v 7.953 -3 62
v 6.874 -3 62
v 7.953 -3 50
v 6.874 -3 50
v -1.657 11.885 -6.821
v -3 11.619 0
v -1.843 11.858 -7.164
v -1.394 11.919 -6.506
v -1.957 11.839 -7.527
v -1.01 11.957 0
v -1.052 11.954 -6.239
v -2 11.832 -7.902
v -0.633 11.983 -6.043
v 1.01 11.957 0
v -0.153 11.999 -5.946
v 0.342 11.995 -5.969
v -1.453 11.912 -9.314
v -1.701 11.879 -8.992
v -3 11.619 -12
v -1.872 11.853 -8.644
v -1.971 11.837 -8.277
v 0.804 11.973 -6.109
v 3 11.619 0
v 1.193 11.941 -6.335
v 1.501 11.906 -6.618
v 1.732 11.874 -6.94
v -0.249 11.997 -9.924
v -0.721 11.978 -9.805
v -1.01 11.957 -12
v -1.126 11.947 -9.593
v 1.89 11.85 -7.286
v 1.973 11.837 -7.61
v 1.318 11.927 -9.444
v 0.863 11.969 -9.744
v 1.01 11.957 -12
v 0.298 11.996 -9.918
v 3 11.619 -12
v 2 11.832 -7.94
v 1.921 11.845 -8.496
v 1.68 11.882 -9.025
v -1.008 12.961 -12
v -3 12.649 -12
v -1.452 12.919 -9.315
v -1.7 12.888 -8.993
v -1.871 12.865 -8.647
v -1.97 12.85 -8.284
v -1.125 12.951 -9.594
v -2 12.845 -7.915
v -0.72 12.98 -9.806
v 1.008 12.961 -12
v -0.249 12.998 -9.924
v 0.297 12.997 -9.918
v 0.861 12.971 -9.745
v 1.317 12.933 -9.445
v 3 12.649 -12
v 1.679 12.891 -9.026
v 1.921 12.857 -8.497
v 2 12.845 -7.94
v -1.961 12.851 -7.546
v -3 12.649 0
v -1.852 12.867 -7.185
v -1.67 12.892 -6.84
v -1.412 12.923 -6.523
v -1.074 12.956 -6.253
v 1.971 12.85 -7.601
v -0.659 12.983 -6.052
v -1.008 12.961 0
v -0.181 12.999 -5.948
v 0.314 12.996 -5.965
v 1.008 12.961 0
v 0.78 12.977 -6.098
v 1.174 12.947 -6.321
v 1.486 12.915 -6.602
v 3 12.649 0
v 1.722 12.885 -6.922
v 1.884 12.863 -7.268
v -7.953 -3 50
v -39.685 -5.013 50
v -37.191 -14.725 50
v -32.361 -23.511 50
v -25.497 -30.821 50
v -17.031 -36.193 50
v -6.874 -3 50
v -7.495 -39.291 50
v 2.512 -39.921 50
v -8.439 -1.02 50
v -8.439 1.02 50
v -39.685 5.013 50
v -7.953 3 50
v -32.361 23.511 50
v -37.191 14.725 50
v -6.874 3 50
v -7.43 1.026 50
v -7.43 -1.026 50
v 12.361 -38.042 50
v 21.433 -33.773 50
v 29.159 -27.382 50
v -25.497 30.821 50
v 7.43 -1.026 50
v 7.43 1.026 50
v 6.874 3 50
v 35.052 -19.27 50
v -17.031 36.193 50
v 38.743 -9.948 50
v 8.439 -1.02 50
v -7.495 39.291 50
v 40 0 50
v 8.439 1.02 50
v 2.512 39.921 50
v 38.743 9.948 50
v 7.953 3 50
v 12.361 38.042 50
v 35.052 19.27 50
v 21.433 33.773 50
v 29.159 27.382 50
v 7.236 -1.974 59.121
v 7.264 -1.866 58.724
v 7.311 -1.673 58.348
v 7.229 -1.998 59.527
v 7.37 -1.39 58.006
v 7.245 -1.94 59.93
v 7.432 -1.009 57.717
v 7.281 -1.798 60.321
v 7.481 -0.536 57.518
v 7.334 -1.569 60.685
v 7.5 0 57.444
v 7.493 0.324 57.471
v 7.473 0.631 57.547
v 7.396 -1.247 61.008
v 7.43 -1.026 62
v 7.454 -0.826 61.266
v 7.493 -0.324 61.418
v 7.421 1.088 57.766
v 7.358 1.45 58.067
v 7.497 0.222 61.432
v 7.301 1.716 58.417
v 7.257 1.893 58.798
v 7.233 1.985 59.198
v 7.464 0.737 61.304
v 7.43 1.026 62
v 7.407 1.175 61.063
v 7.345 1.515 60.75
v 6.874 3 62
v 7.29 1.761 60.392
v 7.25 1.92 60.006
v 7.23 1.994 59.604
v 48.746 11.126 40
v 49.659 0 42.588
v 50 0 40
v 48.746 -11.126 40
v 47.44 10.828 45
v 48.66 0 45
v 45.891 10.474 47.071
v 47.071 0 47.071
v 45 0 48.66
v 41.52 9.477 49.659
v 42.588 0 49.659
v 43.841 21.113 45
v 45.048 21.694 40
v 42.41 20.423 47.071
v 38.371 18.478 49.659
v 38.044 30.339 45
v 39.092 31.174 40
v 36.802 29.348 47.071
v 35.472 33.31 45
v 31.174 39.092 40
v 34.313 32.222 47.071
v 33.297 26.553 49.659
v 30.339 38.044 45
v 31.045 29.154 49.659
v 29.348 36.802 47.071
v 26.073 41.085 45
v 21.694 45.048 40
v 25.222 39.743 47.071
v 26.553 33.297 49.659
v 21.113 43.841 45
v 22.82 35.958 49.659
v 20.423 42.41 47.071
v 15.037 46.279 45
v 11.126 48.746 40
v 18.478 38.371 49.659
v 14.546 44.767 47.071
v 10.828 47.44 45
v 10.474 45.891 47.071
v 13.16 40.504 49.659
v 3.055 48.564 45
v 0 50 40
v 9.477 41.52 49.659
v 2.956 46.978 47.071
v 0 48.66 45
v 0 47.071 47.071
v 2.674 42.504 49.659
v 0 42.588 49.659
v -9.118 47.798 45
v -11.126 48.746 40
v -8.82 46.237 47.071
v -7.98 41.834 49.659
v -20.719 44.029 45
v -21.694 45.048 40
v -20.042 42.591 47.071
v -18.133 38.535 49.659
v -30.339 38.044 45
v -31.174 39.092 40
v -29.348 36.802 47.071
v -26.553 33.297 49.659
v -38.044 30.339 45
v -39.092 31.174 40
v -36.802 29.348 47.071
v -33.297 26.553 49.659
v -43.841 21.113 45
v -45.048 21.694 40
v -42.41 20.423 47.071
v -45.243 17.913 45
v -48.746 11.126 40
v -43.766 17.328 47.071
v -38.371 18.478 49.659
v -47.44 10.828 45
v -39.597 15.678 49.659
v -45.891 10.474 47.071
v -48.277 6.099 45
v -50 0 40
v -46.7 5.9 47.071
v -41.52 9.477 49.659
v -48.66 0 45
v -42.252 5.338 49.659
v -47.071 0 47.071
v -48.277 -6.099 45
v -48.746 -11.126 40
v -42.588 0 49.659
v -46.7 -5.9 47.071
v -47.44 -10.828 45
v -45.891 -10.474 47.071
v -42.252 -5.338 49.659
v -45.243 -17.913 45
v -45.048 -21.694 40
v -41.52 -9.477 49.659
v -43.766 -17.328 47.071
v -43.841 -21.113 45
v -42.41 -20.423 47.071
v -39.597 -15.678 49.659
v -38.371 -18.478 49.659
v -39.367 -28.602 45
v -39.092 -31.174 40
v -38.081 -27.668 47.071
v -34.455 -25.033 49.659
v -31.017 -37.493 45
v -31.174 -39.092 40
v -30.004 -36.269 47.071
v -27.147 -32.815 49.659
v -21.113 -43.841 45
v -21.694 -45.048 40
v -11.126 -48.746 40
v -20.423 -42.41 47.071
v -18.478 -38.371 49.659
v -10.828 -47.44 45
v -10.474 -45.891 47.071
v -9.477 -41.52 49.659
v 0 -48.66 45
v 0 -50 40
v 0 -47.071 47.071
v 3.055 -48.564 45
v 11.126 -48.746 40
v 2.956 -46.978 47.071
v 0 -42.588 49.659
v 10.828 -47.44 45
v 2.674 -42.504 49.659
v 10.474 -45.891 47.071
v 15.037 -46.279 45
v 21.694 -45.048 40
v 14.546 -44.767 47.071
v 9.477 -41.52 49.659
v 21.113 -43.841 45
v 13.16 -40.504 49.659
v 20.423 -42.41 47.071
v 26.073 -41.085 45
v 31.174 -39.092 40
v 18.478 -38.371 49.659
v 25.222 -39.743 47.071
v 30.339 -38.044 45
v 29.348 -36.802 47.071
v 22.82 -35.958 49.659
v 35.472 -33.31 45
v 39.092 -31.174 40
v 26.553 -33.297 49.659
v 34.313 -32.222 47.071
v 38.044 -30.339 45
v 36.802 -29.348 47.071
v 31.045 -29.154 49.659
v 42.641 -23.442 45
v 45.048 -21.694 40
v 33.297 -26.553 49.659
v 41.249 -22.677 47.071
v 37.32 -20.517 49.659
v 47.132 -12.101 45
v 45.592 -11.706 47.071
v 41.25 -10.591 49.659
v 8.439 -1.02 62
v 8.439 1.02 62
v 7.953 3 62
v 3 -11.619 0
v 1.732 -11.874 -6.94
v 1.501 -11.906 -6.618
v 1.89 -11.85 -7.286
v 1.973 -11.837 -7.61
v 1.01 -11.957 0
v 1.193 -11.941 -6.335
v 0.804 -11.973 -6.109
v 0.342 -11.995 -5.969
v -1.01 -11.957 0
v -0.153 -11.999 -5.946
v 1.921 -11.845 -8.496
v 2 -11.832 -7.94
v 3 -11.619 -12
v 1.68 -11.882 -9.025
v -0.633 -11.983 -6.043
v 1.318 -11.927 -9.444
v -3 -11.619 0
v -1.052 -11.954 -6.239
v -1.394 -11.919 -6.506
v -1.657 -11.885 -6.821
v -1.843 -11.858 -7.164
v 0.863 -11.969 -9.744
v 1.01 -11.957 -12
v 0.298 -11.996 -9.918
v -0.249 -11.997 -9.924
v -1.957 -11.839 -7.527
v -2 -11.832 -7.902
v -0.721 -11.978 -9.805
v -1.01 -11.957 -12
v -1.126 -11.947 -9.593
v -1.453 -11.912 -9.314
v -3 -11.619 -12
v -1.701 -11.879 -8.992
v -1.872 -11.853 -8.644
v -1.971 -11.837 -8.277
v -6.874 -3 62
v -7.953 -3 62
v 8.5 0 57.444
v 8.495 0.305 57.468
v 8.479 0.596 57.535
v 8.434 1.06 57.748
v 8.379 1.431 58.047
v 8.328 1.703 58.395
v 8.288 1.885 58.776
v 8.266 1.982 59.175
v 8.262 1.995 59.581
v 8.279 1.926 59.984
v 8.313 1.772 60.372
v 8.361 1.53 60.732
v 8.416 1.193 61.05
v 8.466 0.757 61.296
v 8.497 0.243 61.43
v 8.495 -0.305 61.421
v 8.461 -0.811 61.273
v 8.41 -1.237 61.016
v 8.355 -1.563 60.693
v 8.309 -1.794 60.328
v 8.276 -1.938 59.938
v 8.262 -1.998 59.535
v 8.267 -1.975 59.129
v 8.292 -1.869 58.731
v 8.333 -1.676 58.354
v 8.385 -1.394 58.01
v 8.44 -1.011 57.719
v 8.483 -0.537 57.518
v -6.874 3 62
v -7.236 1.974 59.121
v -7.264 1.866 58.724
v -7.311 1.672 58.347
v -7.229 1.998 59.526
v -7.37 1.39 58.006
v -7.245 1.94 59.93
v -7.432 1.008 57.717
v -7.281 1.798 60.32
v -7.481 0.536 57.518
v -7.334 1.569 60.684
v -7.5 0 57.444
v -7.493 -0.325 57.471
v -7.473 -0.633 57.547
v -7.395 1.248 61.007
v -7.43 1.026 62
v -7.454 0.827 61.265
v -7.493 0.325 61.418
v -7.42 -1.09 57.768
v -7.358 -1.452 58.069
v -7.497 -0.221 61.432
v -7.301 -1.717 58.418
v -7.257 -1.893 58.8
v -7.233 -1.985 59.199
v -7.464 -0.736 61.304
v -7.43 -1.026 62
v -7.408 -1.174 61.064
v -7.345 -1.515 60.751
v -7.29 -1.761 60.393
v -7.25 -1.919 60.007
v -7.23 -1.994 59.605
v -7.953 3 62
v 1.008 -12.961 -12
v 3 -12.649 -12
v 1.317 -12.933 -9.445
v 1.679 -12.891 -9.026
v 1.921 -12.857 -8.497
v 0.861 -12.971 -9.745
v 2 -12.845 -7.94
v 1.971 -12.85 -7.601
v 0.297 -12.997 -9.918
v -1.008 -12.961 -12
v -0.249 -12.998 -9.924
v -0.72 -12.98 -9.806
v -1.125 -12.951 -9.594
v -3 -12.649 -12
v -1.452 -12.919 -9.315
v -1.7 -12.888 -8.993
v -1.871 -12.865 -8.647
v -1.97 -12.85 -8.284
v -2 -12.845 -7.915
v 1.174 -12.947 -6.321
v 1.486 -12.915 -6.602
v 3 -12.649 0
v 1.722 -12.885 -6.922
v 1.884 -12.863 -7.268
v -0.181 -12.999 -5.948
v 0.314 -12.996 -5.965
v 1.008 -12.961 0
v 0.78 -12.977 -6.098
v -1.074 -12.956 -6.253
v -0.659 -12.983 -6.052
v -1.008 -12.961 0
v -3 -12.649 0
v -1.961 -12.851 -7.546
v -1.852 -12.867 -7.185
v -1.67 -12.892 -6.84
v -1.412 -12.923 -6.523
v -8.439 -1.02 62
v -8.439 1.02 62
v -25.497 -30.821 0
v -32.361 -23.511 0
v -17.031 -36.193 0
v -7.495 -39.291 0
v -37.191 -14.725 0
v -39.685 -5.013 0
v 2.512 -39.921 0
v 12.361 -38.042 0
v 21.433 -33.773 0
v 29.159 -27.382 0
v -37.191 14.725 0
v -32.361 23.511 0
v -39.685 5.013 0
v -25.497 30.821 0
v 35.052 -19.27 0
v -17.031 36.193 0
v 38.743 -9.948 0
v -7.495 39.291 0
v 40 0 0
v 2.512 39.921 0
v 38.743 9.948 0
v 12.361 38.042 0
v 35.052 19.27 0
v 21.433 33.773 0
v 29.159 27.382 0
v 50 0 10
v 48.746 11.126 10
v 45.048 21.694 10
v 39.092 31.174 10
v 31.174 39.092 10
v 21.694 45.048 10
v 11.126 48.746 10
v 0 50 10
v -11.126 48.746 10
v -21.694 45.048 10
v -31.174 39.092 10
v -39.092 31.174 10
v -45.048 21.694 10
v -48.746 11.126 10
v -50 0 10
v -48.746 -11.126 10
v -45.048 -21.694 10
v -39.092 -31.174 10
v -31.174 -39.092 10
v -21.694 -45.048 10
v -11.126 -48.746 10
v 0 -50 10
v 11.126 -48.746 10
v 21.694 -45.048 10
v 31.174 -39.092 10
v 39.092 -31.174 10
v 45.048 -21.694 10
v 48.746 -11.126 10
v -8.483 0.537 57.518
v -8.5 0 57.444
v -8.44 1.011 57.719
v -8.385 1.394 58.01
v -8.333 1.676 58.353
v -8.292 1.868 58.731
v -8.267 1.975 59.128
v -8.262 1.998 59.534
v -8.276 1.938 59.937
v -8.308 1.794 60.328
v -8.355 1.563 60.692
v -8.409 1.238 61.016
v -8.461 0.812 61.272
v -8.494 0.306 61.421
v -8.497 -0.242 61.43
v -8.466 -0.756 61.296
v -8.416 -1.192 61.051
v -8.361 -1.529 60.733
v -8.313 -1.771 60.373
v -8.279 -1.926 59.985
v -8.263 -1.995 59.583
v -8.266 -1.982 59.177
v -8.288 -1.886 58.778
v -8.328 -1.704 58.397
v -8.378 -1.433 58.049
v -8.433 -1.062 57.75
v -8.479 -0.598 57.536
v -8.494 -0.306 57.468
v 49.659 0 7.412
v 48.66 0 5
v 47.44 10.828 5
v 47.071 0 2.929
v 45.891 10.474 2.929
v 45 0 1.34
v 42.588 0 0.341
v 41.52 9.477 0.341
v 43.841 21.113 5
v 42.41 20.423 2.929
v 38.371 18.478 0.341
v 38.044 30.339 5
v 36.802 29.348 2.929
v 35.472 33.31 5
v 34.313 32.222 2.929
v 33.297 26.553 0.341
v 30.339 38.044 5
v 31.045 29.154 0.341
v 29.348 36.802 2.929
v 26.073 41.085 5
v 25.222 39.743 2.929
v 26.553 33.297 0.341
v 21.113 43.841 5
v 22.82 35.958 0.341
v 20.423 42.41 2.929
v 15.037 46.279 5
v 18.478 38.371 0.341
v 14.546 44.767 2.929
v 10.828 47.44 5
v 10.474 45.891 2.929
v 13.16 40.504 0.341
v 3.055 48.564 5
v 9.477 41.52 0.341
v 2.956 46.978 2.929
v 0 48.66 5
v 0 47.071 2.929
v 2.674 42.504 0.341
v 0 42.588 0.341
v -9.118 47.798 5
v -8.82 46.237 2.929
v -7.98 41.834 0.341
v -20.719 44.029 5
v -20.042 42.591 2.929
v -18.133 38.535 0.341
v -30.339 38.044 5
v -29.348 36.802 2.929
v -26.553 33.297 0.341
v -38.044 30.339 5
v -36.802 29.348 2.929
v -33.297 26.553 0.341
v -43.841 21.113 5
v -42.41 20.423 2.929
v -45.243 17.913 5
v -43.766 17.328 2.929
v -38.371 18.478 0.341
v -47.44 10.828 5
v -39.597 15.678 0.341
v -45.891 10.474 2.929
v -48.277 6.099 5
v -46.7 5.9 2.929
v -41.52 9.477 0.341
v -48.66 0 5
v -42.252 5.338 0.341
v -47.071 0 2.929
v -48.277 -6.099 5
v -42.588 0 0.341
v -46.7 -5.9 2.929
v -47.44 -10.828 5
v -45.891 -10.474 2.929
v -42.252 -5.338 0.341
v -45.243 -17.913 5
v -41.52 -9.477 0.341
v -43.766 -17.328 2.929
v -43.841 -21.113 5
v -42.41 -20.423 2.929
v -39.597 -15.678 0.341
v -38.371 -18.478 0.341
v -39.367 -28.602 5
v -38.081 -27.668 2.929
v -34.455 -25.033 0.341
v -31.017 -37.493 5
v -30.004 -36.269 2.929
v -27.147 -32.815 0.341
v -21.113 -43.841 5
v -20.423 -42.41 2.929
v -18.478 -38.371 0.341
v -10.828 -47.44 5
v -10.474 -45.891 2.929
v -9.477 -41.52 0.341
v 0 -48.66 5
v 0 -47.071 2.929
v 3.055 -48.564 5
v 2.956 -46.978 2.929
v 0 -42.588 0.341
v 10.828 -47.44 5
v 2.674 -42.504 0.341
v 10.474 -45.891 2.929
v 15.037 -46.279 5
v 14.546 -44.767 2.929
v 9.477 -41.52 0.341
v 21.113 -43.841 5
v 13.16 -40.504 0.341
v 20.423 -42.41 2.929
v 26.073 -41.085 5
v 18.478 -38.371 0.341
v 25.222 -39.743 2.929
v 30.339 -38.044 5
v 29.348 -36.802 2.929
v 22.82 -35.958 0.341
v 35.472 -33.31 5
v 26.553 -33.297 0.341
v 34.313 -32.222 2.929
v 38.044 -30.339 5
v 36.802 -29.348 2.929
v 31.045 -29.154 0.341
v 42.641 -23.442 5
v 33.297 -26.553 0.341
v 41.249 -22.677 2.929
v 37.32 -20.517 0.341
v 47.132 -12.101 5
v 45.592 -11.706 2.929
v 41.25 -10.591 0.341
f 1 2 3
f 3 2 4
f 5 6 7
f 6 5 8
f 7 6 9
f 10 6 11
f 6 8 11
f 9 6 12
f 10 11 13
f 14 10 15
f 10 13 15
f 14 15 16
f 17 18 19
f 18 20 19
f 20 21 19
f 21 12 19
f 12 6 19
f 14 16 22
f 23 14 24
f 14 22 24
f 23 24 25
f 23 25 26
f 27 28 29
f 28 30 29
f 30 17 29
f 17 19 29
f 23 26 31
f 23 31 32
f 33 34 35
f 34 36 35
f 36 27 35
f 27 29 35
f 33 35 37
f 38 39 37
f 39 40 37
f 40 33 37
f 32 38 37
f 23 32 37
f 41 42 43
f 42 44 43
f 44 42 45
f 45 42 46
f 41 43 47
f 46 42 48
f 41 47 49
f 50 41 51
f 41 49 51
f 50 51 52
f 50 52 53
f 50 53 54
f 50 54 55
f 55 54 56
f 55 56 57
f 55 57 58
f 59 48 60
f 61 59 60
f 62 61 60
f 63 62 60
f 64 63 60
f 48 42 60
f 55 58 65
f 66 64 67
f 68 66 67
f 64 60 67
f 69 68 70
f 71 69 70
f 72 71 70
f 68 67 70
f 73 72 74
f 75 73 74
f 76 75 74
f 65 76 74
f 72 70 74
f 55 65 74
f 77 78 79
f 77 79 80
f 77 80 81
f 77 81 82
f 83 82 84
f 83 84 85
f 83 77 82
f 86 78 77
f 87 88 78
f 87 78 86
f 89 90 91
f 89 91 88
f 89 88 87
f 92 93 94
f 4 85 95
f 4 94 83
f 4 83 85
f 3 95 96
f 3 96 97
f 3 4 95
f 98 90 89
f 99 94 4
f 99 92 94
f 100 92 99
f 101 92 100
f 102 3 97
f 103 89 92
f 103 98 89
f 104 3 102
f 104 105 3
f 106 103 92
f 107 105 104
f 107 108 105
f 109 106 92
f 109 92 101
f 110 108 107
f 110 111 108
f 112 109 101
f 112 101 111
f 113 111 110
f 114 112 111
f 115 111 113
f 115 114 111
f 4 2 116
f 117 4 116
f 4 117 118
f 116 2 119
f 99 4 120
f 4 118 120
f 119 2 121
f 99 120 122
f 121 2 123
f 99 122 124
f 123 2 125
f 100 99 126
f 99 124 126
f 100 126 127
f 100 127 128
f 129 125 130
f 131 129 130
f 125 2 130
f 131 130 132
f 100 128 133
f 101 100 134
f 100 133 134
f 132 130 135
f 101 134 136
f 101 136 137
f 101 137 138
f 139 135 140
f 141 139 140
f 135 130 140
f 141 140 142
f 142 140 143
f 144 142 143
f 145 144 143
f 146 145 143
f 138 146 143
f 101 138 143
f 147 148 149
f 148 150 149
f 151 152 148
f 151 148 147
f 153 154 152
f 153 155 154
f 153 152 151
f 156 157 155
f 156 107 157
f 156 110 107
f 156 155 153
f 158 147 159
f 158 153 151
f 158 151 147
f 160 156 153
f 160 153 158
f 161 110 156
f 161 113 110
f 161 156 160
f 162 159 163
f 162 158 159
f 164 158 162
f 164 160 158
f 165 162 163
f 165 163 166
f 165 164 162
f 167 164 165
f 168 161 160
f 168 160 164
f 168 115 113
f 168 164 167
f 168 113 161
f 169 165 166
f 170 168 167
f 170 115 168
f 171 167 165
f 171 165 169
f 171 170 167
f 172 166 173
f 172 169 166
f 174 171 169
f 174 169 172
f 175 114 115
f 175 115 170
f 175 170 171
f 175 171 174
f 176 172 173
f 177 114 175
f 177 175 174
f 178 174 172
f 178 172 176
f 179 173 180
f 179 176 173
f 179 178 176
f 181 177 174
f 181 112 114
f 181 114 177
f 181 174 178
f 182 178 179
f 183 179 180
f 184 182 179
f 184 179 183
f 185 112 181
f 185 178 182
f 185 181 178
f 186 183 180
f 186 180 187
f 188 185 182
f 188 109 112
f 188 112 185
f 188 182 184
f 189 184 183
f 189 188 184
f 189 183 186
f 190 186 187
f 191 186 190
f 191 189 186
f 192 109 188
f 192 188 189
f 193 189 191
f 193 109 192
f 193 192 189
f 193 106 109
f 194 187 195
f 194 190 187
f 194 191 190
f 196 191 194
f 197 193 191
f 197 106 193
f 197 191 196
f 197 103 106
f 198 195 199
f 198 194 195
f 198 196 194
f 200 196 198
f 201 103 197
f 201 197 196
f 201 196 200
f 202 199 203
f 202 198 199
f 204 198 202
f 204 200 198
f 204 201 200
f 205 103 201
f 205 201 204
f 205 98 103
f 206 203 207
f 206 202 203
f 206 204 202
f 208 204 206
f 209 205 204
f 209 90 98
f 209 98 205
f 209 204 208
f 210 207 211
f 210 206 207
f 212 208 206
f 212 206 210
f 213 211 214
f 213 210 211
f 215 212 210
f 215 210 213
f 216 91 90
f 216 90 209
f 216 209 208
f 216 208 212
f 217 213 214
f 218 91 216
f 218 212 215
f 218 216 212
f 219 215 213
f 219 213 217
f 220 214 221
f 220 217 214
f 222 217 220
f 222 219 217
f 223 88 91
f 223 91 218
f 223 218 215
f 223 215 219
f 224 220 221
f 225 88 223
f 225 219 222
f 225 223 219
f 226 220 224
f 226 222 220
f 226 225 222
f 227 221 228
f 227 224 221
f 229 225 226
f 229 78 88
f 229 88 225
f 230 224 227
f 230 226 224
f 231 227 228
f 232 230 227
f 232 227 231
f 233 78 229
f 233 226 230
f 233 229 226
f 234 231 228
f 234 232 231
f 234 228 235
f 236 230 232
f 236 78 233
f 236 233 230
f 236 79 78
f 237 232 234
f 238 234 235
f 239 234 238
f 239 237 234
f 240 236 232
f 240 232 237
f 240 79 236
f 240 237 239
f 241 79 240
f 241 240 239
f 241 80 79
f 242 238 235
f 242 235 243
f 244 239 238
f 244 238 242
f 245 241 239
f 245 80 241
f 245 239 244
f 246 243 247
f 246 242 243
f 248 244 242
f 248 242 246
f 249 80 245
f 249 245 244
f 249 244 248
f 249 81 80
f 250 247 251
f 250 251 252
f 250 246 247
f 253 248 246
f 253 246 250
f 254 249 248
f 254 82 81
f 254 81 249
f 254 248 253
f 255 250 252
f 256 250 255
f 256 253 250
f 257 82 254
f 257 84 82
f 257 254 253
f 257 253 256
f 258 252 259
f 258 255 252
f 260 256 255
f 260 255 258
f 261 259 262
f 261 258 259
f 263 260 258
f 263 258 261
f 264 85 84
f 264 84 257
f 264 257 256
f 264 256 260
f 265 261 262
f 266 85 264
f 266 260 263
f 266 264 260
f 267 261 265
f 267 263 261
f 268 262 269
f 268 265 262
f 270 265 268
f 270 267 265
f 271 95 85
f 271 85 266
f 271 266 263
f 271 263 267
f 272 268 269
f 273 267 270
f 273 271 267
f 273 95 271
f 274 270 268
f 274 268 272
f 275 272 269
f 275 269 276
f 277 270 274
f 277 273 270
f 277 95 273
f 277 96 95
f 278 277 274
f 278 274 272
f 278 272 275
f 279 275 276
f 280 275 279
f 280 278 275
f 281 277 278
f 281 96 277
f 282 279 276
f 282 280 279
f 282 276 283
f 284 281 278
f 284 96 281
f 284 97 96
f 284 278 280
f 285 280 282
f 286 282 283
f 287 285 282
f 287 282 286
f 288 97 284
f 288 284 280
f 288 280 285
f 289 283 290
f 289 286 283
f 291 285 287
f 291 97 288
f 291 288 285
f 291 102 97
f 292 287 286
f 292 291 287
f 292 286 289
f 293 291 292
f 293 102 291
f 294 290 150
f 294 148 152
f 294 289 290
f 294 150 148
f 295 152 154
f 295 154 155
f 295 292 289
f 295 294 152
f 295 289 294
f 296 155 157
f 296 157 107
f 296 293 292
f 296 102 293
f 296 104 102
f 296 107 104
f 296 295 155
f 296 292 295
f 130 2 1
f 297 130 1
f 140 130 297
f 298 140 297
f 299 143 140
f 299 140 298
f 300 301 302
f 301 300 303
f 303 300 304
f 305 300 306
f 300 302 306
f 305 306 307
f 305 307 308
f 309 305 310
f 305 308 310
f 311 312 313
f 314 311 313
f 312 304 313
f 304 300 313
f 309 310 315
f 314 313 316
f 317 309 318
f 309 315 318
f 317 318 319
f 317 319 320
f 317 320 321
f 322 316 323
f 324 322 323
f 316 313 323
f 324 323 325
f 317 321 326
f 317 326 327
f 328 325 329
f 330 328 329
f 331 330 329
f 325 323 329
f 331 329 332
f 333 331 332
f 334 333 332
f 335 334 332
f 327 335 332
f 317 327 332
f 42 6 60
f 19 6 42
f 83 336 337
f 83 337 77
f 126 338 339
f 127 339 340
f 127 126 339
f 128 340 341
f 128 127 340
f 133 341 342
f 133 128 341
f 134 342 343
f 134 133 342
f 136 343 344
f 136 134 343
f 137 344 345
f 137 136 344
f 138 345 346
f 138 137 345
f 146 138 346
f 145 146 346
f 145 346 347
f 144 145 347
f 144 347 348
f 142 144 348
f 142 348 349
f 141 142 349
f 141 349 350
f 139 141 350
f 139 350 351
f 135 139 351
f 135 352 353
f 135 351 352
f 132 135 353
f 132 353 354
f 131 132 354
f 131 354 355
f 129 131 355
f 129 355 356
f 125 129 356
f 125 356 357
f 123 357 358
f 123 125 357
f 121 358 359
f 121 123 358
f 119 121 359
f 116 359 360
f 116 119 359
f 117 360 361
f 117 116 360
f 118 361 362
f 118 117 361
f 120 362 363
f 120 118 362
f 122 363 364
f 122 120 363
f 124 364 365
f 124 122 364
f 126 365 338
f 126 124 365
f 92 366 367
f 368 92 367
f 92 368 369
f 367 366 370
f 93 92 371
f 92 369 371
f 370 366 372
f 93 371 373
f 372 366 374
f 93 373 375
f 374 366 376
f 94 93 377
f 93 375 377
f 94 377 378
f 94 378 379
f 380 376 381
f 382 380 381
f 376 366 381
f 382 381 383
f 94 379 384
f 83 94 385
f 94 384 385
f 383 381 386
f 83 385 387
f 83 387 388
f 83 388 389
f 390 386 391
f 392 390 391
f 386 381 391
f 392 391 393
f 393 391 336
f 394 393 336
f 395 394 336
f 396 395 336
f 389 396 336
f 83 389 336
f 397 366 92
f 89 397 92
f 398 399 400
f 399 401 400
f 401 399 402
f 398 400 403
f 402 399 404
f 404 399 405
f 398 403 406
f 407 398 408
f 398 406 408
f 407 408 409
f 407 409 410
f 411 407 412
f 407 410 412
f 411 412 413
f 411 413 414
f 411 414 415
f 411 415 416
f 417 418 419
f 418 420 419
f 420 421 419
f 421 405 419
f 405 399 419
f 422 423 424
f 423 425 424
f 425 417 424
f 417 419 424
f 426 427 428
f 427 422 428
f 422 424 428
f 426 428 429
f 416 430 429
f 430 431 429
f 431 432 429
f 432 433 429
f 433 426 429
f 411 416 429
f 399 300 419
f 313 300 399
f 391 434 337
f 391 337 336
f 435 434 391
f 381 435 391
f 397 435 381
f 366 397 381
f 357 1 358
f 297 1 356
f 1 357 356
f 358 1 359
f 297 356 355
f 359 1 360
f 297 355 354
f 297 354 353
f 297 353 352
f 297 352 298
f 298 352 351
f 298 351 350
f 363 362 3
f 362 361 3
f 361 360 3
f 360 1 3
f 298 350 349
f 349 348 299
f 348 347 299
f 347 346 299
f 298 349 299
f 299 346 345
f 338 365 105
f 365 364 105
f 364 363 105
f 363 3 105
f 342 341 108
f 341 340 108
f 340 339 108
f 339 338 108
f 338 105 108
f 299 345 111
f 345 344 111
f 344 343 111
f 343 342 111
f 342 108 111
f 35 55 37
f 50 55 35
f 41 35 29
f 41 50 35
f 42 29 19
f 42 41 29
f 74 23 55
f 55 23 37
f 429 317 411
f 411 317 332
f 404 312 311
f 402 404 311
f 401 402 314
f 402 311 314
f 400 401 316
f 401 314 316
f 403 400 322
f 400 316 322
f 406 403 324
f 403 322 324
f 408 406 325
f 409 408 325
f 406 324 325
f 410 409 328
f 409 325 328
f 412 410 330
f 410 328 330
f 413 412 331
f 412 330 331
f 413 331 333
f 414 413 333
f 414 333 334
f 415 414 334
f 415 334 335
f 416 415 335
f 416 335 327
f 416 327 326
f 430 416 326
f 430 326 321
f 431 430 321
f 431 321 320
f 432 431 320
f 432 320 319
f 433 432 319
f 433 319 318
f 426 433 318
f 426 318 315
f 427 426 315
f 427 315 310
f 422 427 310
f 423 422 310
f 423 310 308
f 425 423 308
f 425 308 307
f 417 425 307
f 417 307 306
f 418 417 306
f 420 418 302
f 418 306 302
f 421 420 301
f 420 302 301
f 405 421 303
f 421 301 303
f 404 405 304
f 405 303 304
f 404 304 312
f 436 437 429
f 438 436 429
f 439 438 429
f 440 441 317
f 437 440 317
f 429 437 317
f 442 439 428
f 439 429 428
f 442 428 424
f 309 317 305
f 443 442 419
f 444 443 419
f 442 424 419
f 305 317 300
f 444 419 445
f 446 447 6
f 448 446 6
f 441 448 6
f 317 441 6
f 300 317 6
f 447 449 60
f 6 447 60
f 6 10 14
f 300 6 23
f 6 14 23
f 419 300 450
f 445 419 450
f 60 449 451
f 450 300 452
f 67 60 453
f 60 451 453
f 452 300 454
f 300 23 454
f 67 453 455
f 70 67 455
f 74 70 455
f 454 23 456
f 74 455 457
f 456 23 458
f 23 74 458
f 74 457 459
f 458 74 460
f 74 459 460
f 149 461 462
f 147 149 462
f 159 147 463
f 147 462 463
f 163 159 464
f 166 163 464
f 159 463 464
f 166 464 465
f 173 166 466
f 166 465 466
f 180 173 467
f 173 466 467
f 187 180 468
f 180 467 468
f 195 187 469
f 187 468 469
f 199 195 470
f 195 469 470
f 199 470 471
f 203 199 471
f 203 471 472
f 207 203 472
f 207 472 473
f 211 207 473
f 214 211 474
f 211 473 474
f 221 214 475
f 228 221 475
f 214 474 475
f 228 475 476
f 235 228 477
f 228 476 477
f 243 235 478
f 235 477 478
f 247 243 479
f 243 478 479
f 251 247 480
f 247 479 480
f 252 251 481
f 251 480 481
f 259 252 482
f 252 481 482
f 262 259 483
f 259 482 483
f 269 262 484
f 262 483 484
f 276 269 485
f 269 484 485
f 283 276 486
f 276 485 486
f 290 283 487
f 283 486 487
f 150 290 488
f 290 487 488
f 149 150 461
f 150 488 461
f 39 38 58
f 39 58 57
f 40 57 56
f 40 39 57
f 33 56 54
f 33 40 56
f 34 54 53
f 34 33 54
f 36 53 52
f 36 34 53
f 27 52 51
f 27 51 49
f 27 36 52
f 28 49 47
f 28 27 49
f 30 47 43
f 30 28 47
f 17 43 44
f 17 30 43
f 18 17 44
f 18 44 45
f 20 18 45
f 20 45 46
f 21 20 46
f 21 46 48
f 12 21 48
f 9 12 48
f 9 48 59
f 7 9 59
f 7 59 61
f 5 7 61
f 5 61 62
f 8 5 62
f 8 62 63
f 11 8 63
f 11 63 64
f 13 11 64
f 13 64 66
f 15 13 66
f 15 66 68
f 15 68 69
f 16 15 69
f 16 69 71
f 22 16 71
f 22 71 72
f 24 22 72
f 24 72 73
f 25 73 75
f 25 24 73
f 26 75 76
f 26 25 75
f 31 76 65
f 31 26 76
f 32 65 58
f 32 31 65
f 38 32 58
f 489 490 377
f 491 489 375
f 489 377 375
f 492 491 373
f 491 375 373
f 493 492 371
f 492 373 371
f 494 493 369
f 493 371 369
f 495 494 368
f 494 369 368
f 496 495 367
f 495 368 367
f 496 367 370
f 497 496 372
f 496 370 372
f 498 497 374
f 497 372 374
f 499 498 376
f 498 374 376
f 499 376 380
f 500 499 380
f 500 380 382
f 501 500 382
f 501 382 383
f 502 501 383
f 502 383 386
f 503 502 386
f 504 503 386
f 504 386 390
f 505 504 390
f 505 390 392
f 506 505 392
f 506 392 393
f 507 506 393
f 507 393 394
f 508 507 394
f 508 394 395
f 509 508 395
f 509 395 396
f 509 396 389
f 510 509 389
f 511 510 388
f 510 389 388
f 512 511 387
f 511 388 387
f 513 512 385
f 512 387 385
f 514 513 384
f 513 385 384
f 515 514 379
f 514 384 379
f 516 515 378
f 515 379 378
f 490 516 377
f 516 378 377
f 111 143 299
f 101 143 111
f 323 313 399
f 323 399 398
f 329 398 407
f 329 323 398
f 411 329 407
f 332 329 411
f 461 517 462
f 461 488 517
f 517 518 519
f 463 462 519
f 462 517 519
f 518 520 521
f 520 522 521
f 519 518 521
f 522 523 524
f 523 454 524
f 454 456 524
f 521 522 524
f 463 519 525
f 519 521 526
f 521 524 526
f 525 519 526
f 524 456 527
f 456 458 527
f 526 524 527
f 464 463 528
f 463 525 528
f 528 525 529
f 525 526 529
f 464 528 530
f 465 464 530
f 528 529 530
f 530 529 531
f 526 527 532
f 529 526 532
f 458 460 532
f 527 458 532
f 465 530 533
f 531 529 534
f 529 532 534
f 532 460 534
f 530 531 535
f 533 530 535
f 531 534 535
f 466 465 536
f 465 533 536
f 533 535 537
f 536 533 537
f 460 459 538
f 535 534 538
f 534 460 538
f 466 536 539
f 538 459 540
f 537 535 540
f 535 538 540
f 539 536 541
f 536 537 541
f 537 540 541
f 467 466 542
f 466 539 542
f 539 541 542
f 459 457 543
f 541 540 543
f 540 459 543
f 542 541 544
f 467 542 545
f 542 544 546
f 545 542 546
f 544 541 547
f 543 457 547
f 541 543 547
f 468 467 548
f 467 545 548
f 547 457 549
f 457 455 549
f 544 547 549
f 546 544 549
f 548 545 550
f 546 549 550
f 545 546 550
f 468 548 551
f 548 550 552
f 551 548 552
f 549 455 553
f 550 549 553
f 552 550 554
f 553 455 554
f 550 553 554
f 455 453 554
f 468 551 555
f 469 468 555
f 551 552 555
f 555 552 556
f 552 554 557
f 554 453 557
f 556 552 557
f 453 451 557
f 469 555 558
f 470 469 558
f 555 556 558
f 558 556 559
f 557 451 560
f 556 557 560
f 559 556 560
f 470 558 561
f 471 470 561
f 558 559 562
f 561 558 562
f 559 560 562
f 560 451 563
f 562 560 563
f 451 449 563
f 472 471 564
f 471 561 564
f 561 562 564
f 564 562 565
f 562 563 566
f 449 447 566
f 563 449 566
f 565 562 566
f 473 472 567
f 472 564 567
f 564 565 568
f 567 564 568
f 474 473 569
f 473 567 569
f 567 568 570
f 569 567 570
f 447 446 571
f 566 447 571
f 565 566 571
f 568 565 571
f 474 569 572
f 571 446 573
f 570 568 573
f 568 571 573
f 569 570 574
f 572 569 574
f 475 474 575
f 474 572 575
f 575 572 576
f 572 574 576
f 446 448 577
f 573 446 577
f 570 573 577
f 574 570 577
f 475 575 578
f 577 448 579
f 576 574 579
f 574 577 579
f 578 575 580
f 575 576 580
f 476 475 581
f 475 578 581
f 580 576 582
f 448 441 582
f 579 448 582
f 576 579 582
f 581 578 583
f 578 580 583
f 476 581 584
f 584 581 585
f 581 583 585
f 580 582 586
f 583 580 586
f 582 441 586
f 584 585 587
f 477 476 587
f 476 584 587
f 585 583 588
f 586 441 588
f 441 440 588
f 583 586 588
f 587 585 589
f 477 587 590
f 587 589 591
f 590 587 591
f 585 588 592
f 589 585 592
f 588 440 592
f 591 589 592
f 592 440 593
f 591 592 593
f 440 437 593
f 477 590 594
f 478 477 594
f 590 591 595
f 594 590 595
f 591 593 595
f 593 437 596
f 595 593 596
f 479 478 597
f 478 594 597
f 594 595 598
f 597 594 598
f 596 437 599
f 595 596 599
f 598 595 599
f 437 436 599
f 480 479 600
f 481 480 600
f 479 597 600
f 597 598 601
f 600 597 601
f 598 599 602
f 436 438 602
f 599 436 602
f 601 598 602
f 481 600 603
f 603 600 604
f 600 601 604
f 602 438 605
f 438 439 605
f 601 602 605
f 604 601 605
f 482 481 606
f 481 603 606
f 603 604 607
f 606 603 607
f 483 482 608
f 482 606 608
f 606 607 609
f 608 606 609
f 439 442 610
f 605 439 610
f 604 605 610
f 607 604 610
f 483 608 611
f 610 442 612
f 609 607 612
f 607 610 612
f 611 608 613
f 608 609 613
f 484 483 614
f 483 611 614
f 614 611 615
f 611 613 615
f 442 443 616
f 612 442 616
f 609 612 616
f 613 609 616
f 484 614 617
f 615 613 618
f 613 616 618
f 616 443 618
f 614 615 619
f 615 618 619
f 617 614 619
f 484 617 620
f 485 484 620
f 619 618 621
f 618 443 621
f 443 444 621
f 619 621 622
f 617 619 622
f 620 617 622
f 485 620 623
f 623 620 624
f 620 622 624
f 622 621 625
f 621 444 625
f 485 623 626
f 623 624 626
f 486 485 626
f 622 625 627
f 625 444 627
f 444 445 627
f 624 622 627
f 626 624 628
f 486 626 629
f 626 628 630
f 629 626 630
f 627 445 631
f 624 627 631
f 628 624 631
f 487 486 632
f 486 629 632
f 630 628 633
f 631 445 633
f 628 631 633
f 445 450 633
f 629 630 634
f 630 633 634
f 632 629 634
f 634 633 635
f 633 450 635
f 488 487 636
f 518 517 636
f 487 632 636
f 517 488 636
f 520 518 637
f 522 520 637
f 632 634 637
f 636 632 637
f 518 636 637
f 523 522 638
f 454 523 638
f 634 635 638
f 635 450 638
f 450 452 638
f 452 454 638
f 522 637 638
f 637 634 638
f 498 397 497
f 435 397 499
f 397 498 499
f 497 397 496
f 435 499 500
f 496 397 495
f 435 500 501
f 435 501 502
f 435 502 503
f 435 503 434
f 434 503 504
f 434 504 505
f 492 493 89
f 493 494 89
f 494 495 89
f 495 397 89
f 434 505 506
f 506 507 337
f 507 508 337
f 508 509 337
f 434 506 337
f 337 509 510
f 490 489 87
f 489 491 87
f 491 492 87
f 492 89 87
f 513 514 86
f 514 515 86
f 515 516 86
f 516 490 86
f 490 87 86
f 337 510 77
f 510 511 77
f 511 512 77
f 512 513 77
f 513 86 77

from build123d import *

# Parameters (mm, degrees)
SKETCH2_R                = 50
BOSS_EXTRUDE1_DEPTH      = 50
SKETCH3_R                = 13
BOSS_EXTRUDE2_DEPTH      = 12
SKETCH7_R                = 12
CUT_EXTRUDE3_DEPTH       = 12
SKETCH11_R               = 8.5
BOSS_EXTRUDE3_DEPTH      = 12
SKETCH12_R               = 7.5
CUT_EXTRUDE7_DEPTH       = 12
CUT_EXTRUDE8_DEPTH       = 12
CUT_EXTRUDE8_DEPTH_BACK  = 12
SKETCH15_R               = 2
CUT_EXTRUDE9_DEPTH       = 12
CUT_EXTRUDE9_DEPTH_BACK  = 12
SKETCH16_W               = 12
SKETCH16_H               = 5.5
CUT_EXTRUDE12_DEPTH      = 16
CUT_EXTRUDE12_DEPTH_BACK = 16
SKETCH19_R               = 2
CUT_EXTRUDE13_DEPTH      = 16
CUT_EXTRUDE13_DEPTH_BACK = 16
SKETCH20_W               = 10
SKETCH20_H               = 12
FILLET1_R                = 10


with BuildPart() as part:
    # Sketch2 → Boss-Extrude1 (new body)
    with BuildSketch(Plane.XY):
        Circle(SKETCH2_R)
    extrude(amount=BOSS_EXTRUDE1_DEPTH)

    # Sketch3 → Boss-Extrude2 (add)
    with BuildSketch(Plane(origin=(0, 0, 0), x_dir=(-1, 0, 0), z_dir=(0, 0, -1))):
        Circle(SKETCH3_R)
    extrude(amount=BOSS_EXTRUDE2_DEPTH)

    # Sketch7 → Cut-Extrude3 (cut)
    with BuildSketch(Plane(origin=(0, 0, -12), x_dir=(-1, 0, 0), z_dir=(0, 0, -1))):
        Circle(SKETCH7_R)
    extrude(amount=-CUT_EXTRUDE3_DEPTH, mode=Mode.SUBTRACT)

    # Sketch11 → Boss-Extrude3 (add)
    with BuildSketch(Plane.XY.offset(50)):
        Circle(SKETCH11_R)
    extrude(amount=BOSS_EXTRUDE3_DEPTH)

    # Sketch12 → Cut-Extrude7 (cut)
    with BuildSketch(Plane.XY.offset(62)):
        Circle(SKETCH12_R)
    extrude(amount=-CUT_EXTRUDE7_DEPTH, mode=Mode.SUBTRACT)

    # Sketch15 → Cut-Extrude8 (cut, two sides: drawn at the far end of the back side and taken through both)
    with BuildSketch(Plane(origin=(0, 0, 0), x_dir=(0, 0, -1), z_dir=(1, 0, 0)).offset(-CUT_EXTRUDE8_DEPTH_BACK)):
        with Locations((-59.444436812, 0)):
            Circle(SKETCH15_R)
    extrude(amount=CUT_EXTRUDE8_DEPTH + CUT_EXTRUDE8_DEPTH_BACK, mode=Mode.SUBTRACT)

    # Sketch16 → Cut-Extrude9 (cut, two sides: drawn at the far end of the back side and taken through both)
    with BuildSketch(Plane(origin=(0, 0, 0), x_dir=(0, 0, -1), z_dir=(1, 0, 0)).offset(-CUT_EXTRUDE9_DEPTH_BACK)):
        with Locations((-56, 5.75)):
            Rectangle(SKETCH16_W, SKETCH16_H)
        with Locations((-56, -5.75)):
            Rectangle(SKETCH16_W, SKETCH16_H)
    extrude(amount=CUT_EXTRUDE9_DEPTH + CUT_EXTRUDE9_DEPTH_BACK, mode=Mode.SUBTRACT)

    # Sketch19 → Cut-Extrude12 (cut, two sides: drawn at the far end of the back side and taken through both)
    with BuildSketch(Plane(origin=(0, 0, 0), x_dir=(1, 0, 0), z_dir=(0, 1, 0)).offset(-CUT_EXTRUDE12_DEPTH_BACK)):
        with Locations((0, 7.94)):
            Circle(SKETCH19_R)
    extrude(amount=CUT_EXTRUDE12_DEPTH + CUT_EXTRUDE12_DEPTH_BACK, mode=Mode.SUBTRACT)

    # Sketch20 → Cut-Extrude13 (cut, two sides: drawn at the far end of the back side and taken through both)
    with BuildSketch(Plane(origin=(0, 0, 0), x_dir=(1, 0, 0), z_dir=(0, 1, 0)).offset(-CUT_EXTRUDE13_DEPTH_BACK)):
        with Locations((-8, 6)):
            Rectangle(SKETCH20_W, SKETCH20_H)
        with Locations((8, 6)):
            Rectangle(SKETCH20_W, SKETCH20_H)
    extrude(amount=CUT_EXTRUDE13_DEPTH + CUT_EXTRUDE13_DEPTH_BACK, mode=Mode.SUBTRACT)

    # Fillet1
    fillet1_edges = [part.edges().sort_by_distance(p)[0] for p in [
        (-50, 0, 0),
        (-50, 0, 50),
    ]]
    fillet(fillet1_edges, radius=FILLET1_R)


solid = part.part
